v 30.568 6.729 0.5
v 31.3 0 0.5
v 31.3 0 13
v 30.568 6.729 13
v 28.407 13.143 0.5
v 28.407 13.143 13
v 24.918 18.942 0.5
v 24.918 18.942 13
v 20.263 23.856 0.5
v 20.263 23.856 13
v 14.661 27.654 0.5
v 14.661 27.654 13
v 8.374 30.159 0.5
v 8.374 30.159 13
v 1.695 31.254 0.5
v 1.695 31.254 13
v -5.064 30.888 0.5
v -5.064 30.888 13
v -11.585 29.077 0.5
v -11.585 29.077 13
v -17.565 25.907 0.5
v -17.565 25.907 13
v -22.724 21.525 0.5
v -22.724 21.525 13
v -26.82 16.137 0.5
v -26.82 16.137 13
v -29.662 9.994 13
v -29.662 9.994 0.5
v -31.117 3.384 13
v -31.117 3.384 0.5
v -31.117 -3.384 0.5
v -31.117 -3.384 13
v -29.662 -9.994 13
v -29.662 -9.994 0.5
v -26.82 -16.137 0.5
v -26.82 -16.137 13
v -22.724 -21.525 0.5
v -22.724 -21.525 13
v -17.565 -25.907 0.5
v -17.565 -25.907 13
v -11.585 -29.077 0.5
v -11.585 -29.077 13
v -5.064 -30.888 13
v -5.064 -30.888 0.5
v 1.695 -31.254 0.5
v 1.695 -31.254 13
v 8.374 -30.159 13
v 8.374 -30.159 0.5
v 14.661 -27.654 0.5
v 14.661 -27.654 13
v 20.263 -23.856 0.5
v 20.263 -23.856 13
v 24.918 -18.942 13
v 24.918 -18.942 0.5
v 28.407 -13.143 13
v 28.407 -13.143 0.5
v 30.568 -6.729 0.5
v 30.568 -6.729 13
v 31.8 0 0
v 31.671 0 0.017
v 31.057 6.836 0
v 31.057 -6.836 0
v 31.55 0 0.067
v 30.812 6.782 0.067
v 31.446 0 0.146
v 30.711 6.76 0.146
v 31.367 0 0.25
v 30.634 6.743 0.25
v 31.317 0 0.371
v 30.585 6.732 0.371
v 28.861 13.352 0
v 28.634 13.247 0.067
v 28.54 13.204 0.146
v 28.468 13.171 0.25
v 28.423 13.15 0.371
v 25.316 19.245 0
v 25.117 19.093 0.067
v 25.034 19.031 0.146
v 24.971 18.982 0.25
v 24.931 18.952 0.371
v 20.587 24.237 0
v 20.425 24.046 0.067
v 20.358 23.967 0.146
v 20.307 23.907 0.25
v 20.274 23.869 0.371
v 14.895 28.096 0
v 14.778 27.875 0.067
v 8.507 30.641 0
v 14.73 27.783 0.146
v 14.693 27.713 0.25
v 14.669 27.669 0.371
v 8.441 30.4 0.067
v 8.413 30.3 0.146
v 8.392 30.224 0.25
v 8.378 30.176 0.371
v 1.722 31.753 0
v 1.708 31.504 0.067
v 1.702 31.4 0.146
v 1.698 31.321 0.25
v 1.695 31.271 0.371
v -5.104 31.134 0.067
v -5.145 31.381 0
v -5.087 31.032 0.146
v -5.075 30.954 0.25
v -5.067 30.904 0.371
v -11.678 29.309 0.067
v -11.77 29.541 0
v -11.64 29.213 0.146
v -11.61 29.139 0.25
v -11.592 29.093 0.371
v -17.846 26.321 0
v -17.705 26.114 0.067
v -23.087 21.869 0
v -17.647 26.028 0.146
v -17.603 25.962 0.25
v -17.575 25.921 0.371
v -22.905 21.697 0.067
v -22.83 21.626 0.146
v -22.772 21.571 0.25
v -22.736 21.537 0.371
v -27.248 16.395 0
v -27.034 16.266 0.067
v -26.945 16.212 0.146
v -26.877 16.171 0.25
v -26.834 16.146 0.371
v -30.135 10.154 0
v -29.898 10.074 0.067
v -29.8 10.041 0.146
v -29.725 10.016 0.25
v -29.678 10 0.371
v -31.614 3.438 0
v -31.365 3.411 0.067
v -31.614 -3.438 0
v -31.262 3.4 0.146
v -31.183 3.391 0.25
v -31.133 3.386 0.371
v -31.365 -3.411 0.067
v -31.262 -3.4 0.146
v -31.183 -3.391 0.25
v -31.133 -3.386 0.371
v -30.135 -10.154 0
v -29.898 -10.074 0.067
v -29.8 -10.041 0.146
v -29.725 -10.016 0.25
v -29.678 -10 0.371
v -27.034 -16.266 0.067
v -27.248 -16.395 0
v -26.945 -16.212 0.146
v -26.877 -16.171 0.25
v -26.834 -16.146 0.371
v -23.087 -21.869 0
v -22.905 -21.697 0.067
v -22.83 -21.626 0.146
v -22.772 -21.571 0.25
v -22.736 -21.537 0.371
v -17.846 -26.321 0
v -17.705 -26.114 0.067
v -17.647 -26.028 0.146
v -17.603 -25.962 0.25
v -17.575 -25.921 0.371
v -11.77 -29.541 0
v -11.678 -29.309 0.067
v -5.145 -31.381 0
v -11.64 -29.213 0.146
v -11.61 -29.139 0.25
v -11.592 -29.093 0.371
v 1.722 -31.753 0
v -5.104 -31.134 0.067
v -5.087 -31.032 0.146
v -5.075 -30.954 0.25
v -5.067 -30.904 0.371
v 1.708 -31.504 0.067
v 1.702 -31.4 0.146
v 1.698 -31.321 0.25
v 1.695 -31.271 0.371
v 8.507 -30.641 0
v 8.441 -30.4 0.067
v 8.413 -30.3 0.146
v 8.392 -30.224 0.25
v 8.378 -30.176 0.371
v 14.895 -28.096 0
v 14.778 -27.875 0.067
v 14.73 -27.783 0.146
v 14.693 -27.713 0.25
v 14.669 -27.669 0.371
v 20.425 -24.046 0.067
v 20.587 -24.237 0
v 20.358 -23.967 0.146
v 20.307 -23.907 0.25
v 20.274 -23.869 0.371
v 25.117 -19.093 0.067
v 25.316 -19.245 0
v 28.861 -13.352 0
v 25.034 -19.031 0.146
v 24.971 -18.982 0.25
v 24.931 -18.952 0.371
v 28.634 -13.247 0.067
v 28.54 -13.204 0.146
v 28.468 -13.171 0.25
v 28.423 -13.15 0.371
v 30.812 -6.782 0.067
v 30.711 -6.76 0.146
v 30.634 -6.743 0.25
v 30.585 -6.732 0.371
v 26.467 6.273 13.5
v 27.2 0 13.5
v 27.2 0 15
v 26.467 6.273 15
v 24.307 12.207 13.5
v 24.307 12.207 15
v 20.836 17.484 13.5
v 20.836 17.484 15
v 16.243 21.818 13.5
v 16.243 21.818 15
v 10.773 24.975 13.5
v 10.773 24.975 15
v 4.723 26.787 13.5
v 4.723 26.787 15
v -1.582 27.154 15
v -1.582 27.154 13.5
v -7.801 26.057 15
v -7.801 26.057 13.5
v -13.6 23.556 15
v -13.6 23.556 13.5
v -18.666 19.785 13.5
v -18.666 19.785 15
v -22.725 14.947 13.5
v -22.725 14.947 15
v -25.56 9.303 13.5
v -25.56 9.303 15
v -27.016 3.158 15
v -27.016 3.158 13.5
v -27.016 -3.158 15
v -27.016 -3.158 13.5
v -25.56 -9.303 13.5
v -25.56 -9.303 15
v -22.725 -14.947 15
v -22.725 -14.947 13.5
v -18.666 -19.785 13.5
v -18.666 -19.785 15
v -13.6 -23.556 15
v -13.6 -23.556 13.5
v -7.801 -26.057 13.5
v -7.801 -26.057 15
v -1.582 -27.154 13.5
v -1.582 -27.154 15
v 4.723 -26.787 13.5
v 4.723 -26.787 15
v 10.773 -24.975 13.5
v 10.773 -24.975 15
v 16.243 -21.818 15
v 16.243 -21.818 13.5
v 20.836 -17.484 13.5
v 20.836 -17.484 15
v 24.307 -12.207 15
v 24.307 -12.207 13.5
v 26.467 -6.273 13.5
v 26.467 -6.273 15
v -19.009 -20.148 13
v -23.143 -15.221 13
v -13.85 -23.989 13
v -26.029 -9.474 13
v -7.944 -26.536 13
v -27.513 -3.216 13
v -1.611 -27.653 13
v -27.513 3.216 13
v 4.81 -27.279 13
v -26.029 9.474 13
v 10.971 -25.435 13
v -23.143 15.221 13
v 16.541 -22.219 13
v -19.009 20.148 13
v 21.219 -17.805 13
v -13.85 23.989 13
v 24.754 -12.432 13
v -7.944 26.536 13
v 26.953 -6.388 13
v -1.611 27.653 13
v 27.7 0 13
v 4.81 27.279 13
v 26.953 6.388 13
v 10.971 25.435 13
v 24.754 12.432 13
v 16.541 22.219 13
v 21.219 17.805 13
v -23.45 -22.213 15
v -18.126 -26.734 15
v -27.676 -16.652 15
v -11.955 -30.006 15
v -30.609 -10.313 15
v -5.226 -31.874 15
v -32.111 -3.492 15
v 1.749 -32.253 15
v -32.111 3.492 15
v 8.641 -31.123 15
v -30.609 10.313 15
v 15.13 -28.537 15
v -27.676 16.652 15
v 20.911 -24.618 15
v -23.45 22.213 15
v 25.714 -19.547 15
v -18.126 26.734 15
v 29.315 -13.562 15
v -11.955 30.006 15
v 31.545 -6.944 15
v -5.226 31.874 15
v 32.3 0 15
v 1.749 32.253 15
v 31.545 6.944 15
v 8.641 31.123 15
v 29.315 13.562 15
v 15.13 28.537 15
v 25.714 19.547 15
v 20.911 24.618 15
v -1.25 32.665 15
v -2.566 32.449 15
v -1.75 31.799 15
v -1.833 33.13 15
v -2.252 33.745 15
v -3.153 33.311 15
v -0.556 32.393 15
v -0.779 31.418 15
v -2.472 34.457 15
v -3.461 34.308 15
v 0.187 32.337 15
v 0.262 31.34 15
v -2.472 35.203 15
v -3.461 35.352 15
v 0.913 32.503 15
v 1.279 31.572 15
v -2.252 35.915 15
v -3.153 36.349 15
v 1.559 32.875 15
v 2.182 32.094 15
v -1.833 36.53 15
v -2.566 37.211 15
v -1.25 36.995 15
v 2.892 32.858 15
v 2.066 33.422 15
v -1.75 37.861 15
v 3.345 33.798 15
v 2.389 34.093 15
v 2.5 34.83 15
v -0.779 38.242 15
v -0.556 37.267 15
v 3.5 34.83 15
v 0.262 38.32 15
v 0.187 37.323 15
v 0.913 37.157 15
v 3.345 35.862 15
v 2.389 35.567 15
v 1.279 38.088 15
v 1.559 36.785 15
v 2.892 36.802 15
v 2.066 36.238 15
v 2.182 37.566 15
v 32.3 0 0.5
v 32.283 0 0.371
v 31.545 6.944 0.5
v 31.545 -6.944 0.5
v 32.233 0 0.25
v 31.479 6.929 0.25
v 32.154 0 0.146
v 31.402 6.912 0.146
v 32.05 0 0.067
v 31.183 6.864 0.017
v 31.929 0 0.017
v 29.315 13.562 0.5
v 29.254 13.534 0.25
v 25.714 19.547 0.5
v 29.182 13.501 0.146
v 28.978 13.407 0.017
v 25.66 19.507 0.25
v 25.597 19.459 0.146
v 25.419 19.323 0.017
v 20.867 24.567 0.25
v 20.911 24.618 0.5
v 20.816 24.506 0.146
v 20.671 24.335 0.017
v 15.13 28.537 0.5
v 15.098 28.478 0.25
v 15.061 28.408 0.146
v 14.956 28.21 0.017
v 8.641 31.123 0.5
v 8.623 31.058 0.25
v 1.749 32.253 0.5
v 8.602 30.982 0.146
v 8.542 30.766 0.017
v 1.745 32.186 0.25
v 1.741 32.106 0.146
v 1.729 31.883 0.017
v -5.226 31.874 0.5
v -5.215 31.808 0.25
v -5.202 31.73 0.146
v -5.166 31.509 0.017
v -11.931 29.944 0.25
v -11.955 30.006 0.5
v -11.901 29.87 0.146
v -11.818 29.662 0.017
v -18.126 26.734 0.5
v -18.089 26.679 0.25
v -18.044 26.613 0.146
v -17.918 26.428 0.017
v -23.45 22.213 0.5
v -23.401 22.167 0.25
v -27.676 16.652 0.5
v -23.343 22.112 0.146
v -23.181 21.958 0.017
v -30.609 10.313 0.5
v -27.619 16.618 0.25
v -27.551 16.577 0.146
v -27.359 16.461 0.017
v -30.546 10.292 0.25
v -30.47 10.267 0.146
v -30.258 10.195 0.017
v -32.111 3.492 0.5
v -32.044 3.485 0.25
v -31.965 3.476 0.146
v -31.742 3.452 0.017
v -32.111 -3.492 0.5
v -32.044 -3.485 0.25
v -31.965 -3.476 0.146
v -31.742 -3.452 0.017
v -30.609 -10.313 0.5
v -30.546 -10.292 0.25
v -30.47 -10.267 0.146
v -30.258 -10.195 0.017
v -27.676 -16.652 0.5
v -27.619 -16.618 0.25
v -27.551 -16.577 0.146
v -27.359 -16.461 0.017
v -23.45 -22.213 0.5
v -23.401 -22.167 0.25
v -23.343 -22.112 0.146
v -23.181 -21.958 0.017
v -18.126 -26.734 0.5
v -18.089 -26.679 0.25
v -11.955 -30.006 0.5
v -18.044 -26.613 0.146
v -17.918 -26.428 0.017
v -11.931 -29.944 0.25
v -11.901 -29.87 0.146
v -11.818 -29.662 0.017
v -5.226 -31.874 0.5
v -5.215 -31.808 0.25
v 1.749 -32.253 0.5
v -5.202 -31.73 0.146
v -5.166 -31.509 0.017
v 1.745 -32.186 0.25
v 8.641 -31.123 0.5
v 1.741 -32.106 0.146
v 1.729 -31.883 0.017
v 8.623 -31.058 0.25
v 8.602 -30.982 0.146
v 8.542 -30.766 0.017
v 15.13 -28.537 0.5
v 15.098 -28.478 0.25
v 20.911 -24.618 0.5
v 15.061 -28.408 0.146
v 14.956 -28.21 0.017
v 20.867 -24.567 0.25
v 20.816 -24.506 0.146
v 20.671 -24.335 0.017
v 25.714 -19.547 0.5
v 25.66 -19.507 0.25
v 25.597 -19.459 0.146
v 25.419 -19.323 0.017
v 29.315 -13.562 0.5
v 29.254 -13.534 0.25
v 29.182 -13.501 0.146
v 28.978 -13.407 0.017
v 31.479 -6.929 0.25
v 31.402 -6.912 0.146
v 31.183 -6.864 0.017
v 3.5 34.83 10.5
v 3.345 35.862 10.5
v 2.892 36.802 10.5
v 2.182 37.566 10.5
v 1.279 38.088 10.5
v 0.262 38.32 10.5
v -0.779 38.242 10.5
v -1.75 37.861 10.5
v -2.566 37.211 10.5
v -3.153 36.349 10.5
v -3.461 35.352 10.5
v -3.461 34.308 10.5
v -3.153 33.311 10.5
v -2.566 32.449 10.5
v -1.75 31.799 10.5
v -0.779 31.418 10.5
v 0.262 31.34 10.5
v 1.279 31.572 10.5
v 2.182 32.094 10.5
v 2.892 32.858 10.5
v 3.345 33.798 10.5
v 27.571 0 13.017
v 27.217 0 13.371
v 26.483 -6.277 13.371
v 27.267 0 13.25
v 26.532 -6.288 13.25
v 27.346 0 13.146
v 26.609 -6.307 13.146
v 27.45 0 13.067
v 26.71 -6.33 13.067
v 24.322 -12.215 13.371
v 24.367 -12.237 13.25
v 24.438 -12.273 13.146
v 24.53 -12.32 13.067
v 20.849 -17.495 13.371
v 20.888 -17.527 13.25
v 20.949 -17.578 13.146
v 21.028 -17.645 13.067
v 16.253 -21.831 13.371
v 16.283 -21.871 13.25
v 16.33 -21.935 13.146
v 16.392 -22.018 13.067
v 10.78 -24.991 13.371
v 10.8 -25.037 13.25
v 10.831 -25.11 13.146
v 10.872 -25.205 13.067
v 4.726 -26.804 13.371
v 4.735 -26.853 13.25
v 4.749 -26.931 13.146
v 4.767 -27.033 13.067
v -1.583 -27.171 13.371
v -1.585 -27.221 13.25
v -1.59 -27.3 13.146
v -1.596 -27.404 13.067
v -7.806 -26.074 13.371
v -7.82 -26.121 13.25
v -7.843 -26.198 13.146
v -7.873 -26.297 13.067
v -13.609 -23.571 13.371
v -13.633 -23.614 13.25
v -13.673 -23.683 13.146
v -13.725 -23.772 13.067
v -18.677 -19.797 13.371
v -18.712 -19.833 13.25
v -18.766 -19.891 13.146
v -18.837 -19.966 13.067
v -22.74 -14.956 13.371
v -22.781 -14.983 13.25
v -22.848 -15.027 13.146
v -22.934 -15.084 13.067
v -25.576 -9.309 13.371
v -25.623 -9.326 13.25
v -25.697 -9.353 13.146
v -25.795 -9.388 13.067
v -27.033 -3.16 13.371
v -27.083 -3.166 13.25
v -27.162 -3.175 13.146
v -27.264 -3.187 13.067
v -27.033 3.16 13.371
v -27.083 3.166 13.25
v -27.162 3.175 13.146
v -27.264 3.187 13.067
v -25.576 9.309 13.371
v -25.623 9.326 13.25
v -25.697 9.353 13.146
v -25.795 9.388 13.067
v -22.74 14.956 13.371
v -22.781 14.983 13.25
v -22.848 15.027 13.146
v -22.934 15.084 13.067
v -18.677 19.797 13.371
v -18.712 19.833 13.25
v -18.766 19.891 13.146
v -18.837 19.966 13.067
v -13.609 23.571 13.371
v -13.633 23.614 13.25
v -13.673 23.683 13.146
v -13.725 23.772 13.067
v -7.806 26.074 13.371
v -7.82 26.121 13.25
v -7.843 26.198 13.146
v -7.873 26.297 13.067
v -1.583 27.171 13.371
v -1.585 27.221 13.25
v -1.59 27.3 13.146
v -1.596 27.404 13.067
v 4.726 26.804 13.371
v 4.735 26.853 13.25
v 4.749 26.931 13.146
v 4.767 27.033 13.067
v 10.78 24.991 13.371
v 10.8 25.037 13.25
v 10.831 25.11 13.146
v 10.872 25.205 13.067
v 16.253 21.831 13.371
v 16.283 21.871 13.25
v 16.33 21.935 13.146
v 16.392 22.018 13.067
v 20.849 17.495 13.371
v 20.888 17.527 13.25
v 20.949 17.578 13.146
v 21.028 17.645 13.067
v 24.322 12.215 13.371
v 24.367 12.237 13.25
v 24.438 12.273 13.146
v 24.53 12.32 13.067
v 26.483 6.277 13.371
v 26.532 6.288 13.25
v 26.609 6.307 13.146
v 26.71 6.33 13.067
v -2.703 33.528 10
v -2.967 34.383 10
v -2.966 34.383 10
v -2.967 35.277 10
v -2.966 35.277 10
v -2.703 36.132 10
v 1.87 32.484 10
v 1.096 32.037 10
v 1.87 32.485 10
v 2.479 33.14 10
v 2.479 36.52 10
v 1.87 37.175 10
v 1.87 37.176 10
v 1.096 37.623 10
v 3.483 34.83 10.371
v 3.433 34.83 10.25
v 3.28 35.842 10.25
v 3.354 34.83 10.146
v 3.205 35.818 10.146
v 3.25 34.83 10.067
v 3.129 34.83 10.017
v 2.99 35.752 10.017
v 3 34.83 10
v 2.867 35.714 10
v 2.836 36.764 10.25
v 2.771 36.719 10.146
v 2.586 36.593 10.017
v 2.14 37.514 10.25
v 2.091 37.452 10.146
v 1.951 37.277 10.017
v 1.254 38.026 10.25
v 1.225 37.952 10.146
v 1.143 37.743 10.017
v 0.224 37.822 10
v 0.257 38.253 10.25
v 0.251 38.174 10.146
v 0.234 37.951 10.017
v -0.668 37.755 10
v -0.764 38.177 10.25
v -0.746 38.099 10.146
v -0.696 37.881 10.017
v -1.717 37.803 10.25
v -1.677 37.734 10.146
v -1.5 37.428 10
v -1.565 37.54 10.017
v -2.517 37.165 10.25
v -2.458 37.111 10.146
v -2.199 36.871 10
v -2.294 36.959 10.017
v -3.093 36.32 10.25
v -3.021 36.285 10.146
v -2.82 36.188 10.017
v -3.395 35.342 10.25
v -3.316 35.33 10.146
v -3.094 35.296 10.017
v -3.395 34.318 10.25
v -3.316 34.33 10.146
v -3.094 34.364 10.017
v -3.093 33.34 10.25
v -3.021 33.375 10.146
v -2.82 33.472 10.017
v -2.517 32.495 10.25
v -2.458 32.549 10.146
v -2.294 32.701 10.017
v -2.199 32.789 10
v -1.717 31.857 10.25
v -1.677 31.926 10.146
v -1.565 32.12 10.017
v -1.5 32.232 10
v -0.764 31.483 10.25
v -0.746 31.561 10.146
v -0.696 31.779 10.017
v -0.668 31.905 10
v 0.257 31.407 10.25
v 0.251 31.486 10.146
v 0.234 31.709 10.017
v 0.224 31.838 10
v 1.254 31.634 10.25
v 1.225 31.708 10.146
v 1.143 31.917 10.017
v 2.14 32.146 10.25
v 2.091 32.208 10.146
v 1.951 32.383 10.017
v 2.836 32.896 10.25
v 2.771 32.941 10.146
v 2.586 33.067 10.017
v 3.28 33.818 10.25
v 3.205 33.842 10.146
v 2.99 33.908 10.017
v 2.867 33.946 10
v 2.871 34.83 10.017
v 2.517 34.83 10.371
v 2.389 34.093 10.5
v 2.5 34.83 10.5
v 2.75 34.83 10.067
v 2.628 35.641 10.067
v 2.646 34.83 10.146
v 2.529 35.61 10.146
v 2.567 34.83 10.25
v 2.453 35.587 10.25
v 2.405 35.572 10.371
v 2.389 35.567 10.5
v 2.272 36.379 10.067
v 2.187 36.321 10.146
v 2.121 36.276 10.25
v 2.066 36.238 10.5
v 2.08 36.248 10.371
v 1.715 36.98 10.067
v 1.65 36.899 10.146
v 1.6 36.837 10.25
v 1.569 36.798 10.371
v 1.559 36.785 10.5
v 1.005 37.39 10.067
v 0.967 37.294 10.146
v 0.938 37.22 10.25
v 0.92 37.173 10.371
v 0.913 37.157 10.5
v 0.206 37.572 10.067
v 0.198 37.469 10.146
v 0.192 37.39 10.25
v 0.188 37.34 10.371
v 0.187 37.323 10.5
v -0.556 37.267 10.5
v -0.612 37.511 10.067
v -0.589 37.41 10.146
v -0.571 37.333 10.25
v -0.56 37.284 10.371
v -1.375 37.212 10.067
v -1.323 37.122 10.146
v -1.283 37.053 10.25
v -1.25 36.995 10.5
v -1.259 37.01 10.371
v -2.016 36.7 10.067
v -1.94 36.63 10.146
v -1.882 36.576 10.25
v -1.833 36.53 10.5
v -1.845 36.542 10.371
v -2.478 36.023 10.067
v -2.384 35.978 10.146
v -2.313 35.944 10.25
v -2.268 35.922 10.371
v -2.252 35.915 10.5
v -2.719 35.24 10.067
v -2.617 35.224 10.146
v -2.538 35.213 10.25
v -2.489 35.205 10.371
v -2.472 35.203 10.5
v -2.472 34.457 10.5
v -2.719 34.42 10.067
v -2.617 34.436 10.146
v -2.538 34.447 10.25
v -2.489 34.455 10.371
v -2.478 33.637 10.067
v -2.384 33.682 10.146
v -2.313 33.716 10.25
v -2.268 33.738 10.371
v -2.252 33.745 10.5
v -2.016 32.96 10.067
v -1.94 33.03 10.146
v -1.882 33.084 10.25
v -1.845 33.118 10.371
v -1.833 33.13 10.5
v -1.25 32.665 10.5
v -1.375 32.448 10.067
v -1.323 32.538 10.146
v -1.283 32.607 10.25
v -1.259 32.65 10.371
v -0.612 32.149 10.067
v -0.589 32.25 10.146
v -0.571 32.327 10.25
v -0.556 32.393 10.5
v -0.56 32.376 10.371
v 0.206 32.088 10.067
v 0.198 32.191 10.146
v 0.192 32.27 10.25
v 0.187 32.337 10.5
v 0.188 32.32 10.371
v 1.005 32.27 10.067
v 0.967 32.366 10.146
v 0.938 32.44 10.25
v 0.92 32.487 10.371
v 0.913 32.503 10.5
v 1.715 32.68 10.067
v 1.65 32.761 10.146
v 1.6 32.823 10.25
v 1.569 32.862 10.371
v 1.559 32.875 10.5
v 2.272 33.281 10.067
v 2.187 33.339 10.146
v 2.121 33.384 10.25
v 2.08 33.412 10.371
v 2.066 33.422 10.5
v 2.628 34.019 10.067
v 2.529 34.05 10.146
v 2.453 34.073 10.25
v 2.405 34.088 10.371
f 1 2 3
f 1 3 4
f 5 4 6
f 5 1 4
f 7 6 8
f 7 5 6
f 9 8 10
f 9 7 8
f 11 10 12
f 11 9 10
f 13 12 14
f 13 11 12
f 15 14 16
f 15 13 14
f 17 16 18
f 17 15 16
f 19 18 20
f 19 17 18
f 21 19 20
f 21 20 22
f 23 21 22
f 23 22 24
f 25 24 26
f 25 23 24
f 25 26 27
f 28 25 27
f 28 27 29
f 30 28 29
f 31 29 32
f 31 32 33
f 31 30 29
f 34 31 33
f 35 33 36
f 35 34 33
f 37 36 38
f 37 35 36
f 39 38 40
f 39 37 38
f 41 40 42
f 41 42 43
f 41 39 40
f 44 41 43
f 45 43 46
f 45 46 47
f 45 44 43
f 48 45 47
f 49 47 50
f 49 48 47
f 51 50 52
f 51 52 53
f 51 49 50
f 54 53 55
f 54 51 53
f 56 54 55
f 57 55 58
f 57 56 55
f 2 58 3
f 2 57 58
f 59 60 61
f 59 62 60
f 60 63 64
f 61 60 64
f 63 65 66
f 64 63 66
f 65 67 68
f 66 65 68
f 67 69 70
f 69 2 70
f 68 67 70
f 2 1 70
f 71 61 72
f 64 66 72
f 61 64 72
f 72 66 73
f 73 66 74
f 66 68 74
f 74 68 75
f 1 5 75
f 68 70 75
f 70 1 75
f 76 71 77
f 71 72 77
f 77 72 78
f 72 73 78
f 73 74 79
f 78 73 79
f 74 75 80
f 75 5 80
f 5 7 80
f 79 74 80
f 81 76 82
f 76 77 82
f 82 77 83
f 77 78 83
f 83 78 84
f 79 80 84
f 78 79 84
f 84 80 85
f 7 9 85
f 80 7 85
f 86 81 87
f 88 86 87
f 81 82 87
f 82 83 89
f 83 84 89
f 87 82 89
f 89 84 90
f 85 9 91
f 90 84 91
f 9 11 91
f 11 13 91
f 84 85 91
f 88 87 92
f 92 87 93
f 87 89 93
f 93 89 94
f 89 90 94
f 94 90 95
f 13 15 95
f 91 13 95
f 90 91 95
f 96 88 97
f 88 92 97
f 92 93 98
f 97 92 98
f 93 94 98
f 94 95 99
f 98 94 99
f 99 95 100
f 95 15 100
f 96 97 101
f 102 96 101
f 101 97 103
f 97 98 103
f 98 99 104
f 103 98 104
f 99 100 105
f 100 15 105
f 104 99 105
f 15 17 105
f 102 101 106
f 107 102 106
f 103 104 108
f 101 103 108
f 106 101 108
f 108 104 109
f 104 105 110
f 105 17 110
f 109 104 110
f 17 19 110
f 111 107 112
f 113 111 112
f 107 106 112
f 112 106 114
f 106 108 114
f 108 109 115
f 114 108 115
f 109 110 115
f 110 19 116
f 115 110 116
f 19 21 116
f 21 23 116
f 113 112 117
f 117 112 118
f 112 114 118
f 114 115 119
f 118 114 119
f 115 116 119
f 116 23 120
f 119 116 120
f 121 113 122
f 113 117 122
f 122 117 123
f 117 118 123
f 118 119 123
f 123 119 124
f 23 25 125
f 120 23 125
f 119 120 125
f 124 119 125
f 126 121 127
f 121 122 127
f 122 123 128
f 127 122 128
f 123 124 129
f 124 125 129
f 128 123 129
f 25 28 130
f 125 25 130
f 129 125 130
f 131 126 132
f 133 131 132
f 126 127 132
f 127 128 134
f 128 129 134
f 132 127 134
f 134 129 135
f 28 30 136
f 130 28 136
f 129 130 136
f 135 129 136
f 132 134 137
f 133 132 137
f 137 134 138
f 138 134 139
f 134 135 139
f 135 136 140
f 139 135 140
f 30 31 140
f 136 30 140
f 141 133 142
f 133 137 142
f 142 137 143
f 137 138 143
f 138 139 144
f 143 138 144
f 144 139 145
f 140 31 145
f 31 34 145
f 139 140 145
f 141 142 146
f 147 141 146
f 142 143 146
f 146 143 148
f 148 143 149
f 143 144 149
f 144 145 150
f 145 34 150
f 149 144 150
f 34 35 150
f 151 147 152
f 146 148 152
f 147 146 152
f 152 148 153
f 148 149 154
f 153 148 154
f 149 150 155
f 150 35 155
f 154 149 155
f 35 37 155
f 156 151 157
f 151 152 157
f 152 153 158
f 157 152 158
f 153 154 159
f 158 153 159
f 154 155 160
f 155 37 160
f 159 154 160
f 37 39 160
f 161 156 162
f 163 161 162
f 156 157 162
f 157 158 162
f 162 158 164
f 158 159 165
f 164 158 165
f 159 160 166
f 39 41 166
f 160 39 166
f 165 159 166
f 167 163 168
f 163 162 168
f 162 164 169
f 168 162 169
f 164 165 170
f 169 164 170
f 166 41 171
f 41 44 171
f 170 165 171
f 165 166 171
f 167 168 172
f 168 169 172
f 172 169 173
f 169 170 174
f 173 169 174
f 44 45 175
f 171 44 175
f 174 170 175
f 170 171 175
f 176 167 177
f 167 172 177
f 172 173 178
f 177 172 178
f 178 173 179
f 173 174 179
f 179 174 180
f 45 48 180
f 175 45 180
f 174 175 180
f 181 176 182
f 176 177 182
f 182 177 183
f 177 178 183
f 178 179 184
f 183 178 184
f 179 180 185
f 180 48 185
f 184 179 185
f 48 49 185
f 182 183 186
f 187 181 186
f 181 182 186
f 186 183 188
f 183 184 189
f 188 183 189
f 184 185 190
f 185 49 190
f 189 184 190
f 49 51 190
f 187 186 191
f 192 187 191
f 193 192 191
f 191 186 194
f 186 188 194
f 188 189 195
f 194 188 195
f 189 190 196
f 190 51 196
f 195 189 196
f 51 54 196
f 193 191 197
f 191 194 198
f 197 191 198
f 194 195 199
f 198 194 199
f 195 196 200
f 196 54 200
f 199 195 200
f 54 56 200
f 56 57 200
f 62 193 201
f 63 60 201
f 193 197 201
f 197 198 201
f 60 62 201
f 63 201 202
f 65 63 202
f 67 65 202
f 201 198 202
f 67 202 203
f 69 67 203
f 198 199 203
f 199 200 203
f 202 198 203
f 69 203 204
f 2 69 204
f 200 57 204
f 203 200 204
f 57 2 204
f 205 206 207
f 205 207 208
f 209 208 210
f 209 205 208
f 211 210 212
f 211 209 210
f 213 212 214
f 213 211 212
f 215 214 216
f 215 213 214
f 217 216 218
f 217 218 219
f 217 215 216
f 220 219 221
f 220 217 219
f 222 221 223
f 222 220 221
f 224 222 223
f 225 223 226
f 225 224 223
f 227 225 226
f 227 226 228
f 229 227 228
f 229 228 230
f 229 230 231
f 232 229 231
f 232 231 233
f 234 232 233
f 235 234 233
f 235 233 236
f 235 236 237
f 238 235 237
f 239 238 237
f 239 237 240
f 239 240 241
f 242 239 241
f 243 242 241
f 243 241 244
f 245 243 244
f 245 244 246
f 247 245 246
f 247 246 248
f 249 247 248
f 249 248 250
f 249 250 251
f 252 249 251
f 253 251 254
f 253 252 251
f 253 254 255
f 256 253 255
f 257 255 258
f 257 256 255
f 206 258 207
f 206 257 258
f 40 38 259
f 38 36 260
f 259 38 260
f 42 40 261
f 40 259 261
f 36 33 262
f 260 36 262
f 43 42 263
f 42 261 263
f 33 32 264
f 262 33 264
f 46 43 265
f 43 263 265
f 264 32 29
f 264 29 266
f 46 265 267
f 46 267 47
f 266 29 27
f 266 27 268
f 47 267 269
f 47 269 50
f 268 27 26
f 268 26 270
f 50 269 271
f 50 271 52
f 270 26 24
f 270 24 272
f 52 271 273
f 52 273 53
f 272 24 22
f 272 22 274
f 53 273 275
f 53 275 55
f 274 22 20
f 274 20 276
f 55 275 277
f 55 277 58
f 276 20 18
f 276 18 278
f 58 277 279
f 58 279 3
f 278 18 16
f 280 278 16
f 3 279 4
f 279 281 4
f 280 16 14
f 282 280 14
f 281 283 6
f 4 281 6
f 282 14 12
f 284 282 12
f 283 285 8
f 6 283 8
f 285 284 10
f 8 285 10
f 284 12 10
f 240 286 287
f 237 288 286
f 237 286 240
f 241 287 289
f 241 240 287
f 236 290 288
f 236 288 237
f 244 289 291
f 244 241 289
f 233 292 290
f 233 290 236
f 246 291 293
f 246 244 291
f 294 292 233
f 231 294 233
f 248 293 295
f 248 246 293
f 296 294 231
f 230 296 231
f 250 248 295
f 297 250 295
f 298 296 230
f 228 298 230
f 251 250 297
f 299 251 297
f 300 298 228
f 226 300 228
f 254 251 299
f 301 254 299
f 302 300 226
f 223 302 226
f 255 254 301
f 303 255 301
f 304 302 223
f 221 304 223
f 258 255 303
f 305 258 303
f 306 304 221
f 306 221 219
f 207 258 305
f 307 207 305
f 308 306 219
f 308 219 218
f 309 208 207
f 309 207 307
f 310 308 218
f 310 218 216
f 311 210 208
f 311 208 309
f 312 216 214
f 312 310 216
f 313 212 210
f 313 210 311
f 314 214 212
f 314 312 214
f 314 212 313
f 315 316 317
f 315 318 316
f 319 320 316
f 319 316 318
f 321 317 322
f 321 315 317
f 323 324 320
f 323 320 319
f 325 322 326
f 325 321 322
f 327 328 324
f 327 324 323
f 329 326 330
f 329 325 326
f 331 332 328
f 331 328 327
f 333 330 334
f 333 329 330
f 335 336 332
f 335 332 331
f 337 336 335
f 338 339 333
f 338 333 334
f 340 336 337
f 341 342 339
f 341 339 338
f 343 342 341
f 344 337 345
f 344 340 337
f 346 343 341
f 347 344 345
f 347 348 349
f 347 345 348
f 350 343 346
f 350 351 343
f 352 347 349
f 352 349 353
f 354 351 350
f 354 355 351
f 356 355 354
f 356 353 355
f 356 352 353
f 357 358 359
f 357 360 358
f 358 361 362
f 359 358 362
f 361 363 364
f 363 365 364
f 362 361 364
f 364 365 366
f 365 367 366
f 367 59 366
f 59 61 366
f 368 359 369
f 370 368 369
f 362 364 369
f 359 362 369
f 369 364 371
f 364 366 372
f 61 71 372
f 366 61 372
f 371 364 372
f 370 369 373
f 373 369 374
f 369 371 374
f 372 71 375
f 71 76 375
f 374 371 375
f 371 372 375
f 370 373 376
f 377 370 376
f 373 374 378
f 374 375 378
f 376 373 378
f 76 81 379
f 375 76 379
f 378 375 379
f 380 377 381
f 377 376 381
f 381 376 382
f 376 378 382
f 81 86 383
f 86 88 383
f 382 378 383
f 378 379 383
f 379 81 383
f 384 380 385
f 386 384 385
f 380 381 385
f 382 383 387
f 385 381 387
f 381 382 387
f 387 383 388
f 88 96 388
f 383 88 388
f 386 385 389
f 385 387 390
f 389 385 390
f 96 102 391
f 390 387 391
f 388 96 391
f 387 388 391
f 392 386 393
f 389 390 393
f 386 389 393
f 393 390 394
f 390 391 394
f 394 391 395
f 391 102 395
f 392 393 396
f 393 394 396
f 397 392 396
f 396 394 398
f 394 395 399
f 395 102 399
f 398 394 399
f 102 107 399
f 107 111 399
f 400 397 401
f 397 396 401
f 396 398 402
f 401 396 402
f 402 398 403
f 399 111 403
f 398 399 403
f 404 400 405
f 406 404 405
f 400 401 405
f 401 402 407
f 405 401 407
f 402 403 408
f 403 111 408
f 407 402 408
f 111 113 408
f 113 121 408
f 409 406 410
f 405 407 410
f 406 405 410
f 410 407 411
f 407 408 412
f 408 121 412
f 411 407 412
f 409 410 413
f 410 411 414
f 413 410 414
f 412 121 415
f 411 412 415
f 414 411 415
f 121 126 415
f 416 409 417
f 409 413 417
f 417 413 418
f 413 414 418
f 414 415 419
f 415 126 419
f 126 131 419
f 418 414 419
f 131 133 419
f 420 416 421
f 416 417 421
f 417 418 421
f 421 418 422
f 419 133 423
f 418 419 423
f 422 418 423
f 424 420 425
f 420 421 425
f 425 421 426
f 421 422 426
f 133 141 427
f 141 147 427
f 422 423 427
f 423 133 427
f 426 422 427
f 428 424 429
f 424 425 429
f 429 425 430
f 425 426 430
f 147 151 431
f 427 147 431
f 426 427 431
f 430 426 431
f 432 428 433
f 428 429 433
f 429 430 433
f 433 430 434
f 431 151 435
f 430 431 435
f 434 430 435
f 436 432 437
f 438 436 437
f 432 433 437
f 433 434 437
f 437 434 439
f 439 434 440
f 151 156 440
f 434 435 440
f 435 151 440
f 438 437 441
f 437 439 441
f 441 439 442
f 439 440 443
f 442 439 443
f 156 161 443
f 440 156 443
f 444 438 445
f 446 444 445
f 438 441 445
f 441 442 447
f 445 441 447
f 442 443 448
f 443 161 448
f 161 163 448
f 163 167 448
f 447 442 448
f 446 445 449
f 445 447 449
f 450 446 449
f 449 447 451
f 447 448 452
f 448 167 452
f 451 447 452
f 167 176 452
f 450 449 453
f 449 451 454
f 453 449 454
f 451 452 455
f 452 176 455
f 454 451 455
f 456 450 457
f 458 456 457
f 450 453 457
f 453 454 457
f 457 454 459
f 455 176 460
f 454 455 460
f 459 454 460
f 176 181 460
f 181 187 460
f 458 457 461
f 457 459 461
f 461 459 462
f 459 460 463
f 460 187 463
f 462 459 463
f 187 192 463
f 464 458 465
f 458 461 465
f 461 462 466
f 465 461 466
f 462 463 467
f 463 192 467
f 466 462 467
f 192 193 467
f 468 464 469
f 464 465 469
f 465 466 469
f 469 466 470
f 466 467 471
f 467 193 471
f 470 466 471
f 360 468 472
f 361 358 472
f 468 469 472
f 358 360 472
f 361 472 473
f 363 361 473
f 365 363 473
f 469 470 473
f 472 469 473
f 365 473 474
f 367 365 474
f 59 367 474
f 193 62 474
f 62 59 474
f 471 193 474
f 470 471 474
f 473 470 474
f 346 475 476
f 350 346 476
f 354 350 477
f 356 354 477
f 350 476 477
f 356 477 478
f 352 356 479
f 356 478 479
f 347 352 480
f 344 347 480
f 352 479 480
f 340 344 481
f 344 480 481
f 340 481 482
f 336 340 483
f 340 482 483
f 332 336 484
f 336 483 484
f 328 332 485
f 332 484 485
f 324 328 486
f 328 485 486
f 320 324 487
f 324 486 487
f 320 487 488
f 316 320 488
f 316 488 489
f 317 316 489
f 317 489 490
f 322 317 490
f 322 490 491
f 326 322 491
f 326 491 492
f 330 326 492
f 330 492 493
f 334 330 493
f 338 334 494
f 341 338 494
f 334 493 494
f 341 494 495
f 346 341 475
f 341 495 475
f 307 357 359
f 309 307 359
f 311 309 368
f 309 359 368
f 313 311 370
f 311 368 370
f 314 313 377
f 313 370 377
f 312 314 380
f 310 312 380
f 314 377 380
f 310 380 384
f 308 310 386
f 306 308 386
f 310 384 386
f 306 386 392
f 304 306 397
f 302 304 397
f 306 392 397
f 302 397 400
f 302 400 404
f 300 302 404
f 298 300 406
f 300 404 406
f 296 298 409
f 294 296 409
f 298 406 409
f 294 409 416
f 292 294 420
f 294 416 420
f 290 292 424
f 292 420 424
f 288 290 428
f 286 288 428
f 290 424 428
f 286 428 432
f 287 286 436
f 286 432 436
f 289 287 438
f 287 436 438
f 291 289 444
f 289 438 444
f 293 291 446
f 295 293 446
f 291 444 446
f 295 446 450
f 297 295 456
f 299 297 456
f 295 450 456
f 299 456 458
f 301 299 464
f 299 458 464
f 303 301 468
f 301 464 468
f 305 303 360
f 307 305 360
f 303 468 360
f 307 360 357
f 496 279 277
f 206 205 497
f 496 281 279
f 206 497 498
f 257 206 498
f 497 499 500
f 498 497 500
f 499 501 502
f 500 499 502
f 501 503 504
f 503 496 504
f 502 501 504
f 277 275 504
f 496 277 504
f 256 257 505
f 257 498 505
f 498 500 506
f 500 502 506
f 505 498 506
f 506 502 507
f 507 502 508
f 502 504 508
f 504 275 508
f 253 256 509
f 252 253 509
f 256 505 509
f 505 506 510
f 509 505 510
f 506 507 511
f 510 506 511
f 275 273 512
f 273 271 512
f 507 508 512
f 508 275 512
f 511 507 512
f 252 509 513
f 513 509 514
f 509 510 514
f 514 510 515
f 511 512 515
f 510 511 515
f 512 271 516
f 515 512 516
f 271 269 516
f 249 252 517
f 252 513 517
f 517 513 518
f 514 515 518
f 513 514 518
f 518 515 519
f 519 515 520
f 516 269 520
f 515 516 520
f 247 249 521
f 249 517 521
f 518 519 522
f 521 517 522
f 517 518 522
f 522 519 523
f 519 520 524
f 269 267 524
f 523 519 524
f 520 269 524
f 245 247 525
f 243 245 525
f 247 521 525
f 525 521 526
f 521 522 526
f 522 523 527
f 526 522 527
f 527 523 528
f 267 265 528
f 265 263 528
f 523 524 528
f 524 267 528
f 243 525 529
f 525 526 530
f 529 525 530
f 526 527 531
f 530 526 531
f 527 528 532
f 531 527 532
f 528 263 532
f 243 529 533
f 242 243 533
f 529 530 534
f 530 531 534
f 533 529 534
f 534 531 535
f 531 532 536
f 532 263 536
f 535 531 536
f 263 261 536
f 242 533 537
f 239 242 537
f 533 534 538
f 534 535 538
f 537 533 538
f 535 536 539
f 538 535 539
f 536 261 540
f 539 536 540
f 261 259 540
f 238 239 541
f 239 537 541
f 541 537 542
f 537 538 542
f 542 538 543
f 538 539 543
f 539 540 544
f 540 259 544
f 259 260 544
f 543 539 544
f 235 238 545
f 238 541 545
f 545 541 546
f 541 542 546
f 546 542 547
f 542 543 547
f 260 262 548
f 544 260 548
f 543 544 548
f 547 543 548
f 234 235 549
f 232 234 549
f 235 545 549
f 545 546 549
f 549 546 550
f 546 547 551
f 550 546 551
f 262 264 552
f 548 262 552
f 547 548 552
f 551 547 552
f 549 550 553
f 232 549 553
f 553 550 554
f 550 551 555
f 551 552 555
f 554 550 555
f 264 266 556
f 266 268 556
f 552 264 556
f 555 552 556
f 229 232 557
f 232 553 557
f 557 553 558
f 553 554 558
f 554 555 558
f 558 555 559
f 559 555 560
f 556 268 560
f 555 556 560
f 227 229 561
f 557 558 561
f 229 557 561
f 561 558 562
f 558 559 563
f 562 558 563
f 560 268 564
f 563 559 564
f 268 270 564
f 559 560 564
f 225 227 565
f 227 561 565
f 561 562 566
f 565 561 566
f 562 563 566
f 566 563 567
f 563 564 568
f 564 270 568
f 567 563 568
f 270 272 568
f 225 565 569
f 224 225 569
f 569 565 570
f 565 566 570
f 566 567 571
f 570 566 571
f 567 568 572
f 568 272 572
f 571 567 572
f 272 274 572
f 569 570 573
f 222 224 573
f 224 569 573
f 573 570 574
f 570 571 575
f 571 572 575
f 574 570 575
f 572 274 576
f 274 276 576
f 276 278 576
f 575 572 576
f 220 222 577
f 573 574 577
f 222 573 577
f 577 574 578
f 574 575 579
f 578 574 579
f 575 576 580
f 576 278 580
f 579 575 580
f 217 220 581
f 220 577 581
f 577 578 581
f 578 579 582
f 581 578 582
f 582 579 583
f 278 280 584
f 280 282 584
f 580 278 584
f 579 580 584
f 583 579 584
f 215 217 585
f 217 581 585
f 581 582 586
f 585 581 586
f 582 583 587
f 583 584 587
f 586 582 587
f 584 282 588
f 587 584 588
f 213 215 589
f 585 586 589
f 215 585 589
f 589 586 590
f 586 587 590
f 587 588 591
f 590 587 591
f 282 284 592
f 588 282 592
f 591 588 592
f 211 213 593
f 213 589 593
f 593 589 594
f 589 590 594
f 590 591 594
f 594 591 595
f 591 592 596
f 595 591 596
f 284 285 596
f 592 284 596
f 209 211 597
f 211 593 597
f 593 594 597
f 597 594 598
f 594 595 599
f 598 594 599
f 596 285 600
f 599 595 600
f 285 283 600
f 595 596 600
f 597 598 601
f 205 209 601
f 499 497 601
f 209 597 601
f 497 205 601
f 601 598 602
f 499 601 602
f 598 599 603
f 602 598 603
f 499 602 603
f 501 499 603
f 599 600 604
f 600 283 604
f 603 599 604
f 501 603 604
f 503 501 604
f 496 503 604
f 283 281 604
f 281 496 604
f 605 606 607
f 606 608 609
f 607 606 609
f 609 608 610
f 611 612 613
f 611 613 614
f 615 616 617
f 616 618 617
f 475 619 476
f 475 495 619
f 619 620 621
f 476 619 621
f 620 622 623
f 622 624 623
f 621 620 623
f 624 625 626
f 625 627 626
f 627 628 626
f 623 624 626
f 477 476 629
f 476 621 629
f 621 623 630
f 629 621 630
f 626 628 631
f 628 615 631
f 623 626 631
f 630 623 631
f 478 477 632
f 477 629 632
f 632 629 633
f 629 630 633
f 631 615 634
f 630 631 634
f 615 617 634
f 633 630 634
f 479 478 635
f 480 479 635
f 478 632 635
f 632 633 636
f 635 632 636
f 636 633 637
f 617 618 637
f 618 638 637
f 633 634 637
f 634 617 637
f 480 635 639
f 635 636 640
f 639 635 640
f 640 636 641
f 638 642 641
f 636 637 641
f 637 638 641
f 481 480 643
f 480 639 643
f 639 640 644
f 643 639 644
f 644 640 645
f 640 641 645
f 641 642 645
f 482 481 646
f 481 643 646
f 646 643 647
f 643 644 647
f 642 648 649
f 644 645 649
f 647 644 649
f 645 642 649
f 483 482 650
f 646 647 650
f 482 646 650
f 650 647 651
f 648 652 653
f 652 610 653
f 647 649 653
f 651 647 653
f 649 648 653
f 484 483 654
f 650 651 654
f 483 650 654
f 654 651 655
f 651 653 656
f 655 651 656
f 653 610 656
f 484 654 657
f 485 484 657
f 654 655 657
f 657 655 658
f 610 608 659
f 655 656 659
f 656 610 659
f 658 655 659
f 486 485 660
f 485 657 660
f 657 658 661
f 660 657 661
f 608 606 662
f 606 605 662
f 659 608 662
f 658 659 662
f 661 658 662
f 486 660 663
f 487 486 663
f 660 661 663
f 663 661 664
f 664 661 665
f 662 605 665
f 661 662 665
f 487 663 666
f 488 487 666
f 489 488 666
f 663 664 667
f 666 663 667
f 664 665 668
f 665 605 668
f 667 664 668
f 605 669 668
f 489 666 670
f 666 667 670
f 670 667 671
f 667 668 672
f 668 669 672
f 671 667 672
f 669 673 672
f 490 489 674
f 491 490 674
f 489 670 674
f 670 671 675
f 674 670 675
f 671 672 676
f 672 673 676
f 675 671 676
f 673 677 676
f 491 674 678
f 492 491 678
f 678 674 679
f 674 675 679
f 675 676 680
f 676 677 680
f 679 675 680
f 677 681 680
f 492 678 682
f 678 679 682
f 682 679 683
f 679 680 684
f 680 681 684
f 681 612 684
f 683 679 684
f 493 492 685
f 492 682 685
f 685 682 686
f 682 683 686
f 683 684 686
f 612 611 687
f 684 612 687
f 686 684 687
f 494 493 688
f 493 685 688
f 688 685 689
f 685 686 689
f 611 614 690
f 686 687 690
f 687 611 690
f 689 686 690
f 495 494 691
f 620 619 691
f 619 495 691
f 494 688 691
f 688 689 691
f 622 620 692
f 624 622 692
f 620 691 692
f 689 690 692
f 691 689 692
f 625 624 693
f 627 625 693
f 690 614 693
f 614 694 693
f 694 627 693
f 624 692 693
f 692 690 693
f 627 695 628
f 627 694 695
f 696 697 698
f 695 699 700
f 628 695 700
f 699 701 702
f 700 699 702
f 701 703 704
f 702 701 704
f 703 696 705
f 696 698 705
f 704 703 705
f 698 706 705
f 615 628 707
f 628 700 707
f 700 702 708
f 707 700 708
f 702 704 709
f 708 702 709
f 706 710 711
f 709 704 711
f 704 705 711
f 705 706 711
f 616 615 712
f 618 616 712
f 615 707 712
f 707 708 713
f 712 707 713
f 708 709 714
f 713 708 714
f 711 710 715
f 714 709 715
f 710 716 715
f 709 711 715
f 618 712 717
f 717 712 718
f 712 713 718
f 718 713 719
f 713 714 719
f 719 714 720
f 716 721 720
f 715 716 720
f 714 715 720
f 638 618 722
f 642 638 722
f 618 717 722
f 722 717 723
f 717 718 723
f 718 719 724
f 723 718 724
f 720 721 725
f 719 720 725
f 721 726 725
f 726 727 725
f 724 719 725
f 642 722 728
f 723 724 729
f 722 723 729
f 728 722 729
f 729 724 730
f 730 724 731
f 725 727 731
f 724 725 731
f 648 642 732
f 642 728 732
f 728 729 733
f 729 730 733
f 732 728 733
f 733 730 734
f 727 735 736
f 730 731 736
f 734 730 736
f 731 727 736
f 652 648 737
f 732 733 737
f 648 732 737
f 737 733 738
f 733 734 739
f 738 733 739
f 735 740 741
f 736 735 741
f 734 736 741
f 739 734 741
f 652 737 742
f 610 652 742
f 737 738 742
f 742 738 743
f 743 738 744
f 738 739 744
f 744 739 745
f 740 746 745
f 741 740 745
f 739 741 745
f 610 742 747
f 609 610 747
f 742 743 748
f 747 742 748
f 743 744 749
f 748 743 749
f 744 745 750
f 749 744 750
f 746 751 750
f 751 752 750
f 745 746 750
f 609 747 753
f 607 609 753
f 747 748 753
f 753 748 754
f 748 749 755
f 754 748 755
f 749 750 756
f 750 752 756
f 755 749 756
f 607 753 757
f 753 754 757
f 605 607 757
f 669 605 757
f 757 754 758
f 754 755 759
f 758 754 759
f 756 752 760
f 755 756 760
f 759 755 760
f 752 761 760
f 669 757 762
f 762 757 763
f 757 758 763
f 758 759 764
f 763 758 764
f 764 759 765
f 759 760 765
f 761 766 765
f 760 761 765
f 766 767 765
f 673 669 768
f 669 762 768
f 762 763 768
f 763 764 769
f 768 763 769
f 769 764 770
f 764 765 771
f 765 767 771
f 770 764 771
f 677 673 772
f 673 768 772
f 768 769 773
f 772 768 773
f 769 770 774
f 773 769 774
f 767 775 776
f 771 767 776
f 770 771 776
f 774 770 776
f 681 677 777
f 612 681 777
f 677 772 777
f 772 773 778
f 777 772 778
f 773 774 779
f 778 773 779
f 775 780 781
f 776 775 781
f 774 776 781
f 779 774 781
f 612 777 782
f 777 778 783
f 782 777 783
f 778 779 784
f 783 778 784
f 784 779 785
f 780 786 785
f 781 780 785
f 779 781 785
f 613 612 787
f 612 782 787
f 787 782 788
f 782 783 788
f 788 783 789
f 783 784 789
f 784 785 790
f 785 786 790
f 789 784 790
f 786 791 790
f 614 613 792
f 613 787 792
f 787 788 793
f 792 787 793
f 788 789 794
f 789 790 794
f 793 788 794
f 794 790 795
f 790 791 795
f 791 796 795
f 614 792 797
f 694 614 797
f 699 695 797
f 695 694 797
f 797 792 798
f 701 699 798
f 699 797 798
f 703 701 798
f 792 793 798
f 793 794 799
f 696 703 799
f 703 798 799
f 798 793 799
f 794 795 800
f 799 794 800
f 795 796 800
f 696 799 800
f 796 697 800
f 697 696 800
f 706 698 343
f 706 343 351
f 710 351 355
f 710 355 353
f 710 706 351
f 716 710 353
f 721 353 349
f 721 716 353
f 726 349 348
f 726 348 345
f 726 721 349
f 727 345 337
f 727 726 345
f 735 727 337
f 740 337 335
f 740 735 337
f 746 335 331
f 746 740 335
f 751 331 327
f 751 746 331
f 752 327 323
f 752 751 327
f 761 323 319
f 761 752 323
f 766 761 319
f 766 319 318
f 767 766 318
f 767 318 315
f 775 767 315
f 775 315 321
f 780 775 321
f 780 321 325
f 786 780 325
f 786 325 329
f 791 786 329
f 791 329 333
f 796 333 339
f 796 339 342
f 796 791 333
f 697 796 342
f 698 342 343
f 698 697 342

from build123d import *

# Parameters (mm, degrees)
F0_R     = 32.3
F1_DEPTH = 15
F2_R     = 31.3
F3_DEPTH = 13
F4_R     = 27.2
F5_DEPTH = 15
F6_R     = 3.5
F7_DEPTH = 5
F8_R     = 2.5
F9_DEPTH = 5
F12_R    = 0.49999
F12_2_R  = 0.49999


# Not quite as in the source:
# - a fillet or chamfer is up to 0.001 mm smaller than in the source, because OpenCascade refuses the exact size


with BuildPart() as f1:
    # F0 (on Top) → F1 (new body)
    with BuildSketch(Plane.XY):
        Circle(F0_R)
    extrude(amount=F1_DEPTH)

    # F2 (on Top) → F3 (cut)
    with BuildSketch(Plane.XY):
        Circle(F2_R)
    extrude(amount=F3_DEPTH, mode=Mode.SUBTRACT)

    # F4 (on Top) → F5 (cut)
    with BuildSketch(Plane.XY):
        Circle(F4_R)
    extrude(amount=F5_DEPTH, mode=Mode.SUBTRACT)

    # F12 (radius 0.5 in the source; OpenCascade refuses exactly that, so slightly less here)
    f12_edges = [f1.edges().sort_by_distance(p)[0] for p in [
        (-27.2, 0, 13),
        (-31.3, 0, 0),
        (-32.3, 0, 0),
    ]]
    fillet(f12_edges, radius=F12_R)


with BuildPart() as f7:
    # F6 (on Top) → F7 (new body)
    with BuildSketch(Plane.XY):
        Circle(F6_R)
    extrude(amount=F7_DEPTH)

    # F8 (on Top) → F9 (cut)
    with BuildSketch(Plane.XY):
        Circle(F8_R)
    extrude(amount=F9_DEPTH, mode=Mode.SUBTRACT)


with BuildPart() as f7_1:
    # F10: moved
    add(f7.part.moved(Location((0, 34.6, 0))))


with BuildPart() as f7_2:
    # F11: moved
    add(f7_1.part.moved(Location((0, 0.23, 0))))

    # F12#2 (radius 0.5 in the source; OpenCascade refuses exactly that, so slightly less here)
    f12_2_edges = [f7_2.edges().sort_by_distance(p)[0] for p in [
        (-2.5, 34.83, 0),
        (-3.5, 34.83, 0),
    ]]
    fillet(f12_2_edges, radius=F12_2_R)


with BuildPart() as f7_3:
    # F13: moved
    add(f7_2.part.moved(Location((0, 0, 10))))


solid = Compound([f1.part, f7_3.part])
